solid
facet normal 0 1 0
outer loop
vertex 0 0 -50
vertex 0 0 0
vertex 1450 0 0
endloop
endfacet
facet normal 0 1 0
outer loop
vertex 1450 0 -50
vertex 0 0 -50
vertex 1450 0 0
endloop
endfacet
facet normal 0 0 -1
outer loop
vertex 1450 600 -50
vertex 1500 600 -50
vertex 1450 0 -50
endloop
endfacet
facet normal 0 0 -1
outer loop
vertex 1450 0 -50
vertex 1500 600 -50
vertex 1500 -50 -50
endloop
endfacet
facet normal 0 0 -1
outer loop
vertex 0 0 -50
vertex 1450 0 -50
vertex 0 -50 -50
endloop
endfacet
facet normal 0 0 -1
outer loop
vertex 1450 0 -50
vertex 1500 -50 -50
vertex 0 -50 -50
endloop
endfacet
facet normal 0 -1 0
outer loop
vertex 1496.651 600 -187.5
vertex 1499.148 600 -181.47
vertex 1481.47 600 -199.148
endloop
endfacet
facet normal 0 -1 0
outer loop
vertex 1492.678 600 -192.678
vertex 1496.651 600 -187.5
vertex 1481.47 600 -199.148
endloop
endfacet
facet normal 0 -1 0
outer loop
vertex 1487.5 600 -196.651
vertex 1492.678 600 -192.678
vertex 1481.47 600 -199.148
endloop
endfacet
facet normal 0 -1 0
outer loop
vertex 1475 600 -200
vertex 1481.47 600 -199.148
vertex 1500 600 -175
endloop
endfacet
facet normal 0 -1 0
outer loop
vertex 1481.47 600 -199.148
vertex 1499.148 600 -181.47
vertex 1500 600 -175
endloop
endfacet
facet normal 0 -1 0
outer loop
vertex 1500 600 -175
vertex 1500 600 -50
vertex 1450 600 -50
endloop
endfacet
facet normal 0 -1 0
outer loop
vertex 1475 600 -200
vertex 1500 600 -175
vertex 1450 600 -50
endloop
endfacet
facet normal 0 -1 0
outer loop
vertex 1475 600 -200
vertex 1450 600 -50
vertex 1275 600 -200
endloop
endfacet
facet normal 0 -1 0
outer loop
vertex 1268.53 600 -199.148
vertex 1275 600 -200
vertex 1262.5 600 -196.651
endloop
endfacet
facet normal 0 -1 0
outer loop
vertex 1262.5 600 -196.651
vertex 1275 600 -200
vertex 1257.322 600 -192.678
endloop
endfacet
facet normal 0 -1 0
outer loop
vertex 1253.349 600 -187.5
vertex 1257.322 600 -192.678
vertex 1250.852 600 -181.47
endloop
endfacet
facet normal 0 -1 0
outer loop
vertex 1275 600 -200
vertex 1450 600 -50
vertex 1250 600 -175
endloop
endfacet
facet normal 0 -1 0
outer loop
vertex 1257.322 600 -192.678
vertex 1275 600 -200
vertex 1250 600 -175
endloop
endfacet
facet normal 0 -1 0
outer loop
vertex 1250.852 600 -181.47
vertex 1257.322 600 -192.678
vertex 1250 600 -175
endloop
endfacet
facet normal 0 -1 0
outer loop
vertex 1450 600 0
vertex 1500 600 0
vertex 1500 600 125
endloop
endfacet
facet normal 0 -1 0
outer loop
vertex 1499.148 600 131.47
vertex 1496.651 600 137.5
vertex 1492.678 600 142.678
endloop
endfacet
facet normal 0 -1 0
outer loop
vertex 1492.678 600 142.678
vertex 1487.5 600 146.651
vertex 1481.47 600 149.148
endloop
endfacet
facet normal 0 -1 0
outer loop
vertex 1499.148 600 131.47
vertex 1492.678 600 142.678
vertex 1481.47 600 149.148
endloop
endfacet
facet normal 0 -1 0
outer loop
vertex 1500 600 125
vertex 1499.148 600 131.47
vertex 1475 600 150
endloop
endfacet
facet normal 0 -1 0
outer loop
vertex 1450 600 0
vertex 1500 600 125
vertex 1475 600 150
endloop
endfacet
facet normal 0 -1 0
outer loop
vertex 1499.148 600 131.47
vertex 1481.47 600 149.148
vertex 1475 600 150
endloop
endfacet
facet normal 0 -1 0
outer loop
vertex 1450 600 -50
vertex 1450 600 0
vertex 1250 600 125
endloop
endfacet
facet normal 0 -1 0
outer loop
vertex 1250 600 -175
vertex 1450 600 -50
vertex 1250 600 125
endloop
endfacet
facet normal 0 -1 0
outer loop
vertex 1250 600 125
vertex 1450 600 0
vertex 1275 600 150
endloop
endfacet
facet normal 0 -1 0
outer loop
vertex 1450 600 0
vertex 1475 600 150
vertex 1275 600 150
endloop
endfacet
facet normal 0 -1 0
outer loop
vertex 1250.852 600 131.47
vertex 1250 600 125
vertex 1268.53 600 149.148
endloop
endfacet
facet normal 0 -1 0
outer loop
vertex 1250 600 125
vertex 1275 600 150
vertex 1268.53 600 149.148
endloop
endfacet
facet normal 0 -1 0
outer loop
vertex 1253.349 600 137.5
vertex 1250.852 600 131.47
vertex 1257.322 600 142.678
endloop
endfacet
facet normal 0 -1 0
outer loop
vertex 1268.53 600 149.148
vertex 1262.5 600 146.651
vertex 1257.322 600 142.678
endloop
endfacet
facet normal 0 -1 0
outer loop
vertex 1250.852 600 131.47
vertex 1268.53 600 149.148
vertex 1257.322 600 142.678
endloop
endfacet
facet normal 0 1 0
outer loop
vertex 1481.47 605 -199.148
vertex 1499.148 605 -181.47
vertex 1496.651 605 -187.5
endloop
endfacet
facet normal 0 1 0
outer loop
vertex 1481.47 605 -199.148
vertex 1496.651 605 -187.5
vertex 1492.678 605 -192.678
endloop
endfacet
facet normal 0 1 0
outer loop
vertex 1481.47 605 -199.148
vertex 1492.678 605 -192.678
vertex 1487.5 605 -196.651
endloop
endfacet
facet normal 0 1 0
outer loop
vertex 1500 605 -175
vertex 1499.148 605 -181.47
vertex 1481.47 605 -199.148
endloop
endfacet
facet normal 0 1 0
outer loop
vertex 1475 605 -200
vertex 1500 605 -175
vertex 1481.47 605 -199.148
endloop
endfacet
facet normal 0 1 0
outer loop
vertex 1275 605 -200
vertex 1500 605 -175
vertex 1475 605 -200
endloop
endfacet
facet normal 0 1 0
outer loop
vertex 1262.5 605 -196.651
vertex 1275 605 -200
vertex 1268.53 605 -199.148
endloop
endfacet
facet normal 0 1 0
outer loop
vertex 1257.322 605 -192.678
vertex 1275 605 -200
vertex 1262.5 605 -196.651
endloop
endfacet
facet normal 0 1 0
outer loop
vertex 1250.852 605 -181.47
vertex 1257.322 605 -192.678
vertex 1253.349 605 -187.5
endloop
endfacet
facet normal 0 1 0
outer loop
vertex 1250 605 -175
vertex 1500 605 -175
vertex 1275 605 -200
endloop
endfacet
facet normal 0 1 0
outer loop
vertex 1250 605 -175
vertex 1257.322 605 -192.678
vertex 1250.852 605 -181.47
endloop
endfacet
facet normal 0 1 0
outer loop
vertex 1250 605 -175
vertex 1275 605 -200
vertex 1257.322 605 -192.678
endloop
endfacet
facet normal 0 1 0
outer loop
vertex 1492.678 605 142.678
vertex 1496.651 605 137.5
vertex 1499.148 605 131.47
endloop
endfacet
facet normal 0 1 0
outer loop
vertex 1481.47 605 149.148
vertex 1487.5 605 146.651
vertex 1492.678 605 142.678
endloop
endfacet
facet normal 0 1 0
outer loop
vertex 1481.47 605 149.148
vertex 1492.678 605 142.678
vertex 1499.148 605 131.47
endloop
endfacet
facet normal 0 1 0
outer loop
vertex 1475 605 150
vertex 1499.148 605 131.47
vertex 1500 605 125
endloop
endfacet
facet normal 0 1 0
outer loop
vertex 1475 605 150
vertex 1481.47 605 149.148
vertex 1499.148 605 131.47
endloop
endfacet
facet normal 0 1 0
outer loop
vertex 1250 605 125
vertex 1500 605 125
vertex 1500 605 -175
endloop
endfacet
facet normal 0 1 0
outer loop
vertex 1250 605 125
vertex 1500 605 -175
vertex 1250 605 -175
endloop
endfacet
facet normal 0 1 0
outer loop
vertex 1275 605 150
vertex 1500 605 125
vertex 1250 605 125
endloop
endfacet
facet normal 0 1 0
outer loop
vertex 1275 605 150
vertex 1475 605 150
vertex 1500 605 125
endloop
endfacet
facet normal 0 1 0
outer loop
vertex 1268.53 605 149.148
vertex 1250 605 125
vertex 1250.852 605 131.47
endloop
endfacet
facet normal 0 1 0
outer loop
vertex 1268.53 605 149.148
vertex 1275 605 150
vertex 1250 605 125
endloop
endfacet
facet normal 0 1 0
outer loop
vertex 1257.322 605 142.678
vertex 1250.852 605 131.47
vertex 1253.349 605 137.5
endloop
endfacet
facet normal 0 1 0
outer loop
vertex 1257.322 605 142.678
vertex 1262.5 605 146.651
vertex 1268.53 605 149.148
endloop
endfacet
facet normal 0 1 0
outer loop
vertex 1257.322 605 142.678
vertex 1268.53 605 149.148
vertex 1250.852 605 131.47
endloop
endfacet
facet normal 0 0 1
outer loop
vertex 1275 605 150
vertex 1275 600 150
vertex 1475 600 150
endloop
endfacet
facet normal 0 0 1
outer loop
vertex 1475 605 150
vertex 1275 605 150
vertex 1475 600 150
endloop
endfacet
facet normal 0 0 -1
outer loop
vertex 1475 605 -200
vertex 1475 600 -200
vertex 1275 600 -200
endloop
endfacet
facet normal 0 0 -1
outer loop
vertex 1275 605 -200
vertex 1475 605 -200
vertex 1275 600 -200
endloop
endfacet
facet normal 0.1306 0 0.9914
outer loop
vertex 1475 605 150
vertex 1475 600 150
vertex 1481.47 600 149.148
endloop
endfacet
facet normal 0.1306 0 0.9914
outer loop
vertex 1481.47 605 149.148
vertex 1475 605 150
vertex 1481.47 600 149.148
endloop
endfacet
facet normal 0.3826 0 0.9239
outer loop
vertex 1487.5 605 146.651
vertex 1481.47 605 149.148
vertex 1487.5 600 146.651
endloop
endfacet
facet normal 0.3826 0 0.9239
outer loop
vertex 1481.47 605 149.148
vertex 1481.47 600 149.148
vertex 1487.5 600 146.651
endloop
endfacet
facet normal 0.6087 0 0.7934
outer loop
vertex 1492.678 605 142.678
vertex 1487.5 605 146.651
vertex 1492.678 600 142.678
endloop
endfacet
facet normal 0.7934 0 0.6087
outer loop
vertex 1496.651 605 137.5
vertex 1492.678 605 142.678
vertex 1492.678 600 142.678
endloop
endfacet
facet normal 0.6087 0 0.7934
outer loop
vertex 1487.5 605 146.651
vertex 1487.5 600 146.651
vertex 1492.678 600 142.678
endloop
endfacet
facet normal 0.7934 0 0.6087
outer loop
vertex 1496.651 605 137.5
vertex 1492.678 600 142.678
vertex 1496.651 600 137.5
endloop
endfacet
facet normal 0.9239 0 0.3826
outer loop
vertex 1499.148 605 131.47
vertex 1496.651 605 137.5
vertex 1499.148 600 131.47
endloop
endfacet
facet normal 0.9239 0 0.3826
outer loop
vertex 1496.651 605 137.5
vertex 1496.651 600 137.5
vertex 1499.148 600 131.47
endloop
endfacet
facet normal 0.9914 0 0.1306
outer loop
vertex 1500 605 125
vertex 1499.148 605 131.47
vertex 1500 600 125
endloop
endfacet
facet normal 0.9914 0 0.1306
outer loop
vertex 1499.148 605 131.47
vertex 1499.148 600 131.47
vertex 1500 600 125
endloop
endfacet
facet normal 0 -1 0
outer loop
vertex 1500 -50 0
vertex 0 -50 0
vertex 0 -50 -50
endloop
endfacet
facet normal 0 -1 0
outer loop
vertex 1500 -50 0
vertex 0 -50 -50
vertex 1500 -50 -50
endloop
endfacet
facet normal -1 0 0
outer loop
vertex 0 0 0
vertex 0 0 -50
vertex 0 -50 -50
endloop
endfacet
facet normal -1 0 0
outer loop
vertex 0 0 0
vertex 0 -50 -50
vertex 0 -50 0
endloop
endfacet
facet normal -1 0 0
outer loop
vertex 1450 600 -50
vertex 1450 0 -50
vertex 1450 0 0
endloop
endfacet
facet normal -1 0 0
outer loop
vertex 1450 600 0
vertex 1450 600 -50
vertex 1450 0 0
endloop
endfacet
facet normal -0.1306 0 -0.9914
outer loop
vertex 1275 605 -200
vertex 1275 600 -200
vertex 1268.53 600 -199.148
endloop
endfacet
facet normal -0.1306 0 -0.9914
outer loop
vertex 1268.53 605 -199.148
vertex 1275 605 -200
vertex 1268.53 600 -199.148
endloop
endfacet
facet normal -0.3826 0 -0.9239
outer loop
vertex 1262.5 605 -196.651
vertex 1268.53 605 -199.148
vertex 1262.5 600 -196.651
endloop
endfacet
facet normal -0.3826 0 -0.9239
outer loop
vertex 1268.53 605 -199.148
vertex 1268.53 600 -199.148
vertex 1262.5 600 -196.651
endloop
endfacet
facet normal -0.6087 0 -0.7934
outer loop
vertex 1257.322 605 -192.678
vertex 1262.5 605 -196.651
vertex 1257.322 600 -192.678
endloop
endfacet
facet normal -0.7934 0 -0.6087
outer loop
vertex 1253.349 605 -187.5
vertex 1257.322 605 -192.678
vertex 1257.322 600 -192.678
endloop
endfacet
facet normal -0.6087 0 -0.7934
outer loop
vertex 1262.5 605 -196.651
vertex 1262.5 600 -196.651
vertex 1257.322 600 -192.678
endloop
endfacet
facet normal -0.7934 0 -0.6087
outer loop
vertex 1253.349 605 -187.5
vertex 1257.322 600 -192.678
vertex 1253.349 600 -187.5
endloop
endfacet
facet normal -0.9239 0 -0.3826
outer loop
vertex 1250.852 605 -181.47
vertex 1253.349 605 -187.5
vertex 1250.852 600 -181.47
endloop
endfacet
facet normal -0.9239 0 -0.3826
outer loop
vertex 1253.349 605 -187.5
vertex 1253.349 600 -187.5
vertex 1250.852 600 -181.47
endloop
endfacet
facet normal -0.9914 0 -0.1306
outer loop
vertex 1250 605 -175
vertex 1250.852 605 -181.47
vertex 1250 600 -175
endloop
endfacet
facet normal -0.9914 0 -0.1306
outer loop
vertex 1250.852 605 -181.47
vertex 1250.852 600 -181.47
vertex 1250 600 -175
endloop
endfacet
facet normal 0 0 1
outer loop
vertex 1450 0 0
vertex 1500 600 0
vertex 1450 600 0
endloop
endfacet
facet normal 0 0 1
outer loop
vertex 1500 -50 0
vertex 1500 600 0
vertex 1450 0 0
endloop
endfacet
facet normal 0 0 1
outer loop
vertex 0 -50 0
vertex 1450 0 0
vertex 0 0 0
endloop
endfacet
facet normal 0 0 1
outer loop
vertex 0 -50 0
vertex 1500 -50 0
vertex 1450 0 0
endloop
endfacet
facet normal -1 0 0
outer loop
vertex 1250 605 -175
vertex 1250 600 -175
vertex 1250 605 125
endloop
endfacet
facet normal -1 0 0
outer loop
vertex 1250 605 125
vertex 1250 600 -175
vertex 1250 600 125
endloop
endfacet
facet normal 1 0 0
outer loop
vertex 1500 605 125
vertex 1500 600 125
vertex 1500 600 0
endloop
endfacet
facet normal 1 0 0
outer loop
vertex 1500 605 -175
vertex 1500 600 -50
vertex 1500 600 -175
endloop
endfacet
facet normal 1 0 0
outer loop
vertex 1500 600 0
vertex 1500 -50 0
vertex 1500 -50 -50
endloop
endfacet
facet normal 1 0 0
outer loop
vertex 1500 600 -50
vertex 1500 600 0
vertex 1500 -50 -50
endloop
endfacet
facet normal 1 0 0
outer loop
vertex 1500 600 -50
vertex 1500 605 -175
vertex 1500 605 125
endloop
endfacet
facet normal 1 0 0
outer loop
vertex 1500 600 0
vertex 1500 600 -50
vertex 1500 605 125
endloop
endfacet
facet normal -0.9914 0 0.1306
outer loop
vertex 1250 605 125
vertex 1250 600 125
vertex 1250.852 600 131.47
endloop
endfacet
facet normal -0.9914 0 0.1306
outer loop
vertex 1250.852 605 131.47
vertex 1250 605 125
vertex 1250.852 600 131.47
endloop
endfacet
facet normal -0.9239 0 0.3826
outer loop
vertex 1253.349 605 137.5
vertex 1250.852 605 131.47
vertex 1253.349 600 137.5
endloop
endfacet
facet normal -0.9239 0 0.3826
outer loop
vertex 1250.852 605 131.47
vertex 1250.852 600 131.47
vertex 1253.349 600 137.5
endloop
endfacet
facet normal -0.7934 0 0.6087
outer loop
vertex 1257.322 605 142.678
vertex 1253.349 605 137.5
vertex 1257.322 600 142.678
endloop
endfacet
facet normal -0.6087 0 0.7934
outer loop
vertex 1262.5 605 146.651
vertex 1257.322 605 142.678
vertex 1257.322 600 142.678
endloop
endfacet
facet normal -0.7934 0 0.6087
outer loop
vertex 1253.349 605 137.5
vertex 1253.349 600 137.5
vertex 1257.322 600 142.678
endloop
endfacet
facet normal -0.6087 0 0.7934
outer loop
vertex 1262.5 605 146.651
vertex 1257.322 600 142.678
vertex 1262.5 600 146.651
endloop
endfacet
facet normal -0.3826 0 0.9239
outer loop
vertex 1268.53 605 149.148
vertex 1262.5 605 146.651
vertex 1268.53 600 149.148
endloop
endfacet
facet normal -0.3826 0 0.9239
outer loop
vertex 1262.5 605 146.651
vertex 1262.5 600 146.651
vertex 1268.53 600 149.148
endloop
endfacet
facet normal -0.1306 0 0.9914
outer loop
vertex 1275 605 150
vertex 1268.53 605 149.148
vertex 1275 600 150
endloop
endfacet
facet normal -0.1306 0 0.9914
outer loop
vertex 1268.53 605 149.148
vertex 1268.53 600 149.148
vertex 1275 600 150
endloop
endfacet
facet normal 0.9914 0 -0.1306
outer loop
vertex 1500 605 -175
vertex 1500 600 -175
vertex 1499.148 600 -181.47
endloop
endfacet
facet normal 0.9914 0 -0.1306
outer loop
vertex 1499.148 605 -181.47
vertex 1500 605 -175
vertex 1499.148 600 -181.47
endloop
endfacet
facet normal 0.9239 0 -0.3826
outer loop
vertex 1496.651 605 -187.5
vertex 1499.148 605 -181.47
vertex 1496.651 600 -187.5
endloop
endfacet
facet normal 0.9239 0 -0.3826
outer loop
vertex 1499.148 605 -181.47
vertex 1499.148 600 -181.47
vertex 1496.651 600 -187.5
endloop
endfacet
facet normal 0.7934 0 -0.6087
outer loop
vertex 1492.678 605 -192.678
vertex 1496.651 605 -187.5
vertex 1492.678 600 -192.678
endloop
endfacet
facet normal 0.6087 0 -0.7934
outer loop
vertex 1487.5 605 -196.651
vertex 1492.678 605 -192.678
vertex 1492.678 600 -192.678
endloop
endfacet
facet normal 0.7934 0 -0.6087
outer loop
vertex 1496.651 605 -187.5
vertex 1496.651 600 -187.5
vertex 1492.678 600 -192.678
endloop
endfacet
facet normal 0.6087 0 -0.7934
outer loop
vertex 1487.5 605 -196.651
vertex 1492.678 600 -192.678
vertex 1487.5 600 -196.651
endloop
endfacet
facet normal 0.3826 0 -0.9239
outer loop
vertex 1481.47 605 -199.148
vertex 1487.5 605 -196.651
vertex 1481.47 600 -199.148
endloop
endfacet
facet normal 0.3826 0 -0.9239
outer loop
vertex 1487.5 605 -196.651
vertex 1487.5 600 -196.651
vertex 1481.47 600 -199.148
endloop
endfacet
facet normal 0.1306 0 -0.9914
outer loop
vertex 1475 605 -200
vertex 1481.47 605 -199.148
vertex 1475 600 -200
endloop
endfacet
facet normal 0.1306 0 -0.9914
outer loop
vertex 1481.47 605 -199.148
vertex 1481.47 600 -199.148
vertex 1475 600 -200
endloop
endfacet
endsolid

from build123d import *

# Parameters (mm, degrees)
F0_W     = 1500
F0_H     = 50
F1_DEPTH = 50
F2_W     = 50
F2_H     = 50
F3_DEPTH = 600
F4_W     = 50
F4_H     = 50
F5_DEPTH = 5


with BuildPart() as f1:
    # F0 (on Front) → F1 (new body)
    with BuildSketch(Plane.XZ):
        with Locations((750, -25)):
            Rectangle(F0_W, F0_H)
    extrude(amount=F1_DEPTH)

    # F2 (on face) → F3 (join)
    with BuildSketch(Plane(origin=(0, 0, 0), x_dir=(-1, 0, 0), z_dir=(0, 1, 0))):
        with Locations((-1475, -25)):
            Rectangle(F2_W, F2_H)
    extrude(amount=F3_DEPTH)

    # F4 (on face) → F5 (join)
    with BuildSketch(Plane(origin=(0, 600, 0), x_dir=(-1, 0, 0), z_dir=(0, 1, 0))):
        with BuildLine():
            Line((-1275, 150), (-1475, 150))
            ThreePointArc((-1475, 150), (-1492.67767, 142.67767), (-1500, 125))
            Line((-1500, 125), (-1500, 0))
            Line((-1500, 0), (-1450, 0))
            Line((-1450, 0), (-1450, -50))
            Line((-1450, -50), (-1500, -50))
            Line((-1500, -50), (-1500, -175))
            ThreePointArc((-1500, -175), (-1492.67767, -192.67767), (-1475, -200))
            Line((-1475, -200), (-1275, -200))
            ThreePointArc((-1275, -200), (-1257.32233, -192.67767), (-1250, -175))
            Line((-1250, -175), (-1250, 125))
            ThreePointArc((-1250, 125), (-1257.32233, 142.67767), (-1275, 150))
        make_face()
        with Locations((-1475, -25)):
            Rectangle(F4_W, F4_H)
    extrude(amount=F5_DEPTH)


solid = f1.part
